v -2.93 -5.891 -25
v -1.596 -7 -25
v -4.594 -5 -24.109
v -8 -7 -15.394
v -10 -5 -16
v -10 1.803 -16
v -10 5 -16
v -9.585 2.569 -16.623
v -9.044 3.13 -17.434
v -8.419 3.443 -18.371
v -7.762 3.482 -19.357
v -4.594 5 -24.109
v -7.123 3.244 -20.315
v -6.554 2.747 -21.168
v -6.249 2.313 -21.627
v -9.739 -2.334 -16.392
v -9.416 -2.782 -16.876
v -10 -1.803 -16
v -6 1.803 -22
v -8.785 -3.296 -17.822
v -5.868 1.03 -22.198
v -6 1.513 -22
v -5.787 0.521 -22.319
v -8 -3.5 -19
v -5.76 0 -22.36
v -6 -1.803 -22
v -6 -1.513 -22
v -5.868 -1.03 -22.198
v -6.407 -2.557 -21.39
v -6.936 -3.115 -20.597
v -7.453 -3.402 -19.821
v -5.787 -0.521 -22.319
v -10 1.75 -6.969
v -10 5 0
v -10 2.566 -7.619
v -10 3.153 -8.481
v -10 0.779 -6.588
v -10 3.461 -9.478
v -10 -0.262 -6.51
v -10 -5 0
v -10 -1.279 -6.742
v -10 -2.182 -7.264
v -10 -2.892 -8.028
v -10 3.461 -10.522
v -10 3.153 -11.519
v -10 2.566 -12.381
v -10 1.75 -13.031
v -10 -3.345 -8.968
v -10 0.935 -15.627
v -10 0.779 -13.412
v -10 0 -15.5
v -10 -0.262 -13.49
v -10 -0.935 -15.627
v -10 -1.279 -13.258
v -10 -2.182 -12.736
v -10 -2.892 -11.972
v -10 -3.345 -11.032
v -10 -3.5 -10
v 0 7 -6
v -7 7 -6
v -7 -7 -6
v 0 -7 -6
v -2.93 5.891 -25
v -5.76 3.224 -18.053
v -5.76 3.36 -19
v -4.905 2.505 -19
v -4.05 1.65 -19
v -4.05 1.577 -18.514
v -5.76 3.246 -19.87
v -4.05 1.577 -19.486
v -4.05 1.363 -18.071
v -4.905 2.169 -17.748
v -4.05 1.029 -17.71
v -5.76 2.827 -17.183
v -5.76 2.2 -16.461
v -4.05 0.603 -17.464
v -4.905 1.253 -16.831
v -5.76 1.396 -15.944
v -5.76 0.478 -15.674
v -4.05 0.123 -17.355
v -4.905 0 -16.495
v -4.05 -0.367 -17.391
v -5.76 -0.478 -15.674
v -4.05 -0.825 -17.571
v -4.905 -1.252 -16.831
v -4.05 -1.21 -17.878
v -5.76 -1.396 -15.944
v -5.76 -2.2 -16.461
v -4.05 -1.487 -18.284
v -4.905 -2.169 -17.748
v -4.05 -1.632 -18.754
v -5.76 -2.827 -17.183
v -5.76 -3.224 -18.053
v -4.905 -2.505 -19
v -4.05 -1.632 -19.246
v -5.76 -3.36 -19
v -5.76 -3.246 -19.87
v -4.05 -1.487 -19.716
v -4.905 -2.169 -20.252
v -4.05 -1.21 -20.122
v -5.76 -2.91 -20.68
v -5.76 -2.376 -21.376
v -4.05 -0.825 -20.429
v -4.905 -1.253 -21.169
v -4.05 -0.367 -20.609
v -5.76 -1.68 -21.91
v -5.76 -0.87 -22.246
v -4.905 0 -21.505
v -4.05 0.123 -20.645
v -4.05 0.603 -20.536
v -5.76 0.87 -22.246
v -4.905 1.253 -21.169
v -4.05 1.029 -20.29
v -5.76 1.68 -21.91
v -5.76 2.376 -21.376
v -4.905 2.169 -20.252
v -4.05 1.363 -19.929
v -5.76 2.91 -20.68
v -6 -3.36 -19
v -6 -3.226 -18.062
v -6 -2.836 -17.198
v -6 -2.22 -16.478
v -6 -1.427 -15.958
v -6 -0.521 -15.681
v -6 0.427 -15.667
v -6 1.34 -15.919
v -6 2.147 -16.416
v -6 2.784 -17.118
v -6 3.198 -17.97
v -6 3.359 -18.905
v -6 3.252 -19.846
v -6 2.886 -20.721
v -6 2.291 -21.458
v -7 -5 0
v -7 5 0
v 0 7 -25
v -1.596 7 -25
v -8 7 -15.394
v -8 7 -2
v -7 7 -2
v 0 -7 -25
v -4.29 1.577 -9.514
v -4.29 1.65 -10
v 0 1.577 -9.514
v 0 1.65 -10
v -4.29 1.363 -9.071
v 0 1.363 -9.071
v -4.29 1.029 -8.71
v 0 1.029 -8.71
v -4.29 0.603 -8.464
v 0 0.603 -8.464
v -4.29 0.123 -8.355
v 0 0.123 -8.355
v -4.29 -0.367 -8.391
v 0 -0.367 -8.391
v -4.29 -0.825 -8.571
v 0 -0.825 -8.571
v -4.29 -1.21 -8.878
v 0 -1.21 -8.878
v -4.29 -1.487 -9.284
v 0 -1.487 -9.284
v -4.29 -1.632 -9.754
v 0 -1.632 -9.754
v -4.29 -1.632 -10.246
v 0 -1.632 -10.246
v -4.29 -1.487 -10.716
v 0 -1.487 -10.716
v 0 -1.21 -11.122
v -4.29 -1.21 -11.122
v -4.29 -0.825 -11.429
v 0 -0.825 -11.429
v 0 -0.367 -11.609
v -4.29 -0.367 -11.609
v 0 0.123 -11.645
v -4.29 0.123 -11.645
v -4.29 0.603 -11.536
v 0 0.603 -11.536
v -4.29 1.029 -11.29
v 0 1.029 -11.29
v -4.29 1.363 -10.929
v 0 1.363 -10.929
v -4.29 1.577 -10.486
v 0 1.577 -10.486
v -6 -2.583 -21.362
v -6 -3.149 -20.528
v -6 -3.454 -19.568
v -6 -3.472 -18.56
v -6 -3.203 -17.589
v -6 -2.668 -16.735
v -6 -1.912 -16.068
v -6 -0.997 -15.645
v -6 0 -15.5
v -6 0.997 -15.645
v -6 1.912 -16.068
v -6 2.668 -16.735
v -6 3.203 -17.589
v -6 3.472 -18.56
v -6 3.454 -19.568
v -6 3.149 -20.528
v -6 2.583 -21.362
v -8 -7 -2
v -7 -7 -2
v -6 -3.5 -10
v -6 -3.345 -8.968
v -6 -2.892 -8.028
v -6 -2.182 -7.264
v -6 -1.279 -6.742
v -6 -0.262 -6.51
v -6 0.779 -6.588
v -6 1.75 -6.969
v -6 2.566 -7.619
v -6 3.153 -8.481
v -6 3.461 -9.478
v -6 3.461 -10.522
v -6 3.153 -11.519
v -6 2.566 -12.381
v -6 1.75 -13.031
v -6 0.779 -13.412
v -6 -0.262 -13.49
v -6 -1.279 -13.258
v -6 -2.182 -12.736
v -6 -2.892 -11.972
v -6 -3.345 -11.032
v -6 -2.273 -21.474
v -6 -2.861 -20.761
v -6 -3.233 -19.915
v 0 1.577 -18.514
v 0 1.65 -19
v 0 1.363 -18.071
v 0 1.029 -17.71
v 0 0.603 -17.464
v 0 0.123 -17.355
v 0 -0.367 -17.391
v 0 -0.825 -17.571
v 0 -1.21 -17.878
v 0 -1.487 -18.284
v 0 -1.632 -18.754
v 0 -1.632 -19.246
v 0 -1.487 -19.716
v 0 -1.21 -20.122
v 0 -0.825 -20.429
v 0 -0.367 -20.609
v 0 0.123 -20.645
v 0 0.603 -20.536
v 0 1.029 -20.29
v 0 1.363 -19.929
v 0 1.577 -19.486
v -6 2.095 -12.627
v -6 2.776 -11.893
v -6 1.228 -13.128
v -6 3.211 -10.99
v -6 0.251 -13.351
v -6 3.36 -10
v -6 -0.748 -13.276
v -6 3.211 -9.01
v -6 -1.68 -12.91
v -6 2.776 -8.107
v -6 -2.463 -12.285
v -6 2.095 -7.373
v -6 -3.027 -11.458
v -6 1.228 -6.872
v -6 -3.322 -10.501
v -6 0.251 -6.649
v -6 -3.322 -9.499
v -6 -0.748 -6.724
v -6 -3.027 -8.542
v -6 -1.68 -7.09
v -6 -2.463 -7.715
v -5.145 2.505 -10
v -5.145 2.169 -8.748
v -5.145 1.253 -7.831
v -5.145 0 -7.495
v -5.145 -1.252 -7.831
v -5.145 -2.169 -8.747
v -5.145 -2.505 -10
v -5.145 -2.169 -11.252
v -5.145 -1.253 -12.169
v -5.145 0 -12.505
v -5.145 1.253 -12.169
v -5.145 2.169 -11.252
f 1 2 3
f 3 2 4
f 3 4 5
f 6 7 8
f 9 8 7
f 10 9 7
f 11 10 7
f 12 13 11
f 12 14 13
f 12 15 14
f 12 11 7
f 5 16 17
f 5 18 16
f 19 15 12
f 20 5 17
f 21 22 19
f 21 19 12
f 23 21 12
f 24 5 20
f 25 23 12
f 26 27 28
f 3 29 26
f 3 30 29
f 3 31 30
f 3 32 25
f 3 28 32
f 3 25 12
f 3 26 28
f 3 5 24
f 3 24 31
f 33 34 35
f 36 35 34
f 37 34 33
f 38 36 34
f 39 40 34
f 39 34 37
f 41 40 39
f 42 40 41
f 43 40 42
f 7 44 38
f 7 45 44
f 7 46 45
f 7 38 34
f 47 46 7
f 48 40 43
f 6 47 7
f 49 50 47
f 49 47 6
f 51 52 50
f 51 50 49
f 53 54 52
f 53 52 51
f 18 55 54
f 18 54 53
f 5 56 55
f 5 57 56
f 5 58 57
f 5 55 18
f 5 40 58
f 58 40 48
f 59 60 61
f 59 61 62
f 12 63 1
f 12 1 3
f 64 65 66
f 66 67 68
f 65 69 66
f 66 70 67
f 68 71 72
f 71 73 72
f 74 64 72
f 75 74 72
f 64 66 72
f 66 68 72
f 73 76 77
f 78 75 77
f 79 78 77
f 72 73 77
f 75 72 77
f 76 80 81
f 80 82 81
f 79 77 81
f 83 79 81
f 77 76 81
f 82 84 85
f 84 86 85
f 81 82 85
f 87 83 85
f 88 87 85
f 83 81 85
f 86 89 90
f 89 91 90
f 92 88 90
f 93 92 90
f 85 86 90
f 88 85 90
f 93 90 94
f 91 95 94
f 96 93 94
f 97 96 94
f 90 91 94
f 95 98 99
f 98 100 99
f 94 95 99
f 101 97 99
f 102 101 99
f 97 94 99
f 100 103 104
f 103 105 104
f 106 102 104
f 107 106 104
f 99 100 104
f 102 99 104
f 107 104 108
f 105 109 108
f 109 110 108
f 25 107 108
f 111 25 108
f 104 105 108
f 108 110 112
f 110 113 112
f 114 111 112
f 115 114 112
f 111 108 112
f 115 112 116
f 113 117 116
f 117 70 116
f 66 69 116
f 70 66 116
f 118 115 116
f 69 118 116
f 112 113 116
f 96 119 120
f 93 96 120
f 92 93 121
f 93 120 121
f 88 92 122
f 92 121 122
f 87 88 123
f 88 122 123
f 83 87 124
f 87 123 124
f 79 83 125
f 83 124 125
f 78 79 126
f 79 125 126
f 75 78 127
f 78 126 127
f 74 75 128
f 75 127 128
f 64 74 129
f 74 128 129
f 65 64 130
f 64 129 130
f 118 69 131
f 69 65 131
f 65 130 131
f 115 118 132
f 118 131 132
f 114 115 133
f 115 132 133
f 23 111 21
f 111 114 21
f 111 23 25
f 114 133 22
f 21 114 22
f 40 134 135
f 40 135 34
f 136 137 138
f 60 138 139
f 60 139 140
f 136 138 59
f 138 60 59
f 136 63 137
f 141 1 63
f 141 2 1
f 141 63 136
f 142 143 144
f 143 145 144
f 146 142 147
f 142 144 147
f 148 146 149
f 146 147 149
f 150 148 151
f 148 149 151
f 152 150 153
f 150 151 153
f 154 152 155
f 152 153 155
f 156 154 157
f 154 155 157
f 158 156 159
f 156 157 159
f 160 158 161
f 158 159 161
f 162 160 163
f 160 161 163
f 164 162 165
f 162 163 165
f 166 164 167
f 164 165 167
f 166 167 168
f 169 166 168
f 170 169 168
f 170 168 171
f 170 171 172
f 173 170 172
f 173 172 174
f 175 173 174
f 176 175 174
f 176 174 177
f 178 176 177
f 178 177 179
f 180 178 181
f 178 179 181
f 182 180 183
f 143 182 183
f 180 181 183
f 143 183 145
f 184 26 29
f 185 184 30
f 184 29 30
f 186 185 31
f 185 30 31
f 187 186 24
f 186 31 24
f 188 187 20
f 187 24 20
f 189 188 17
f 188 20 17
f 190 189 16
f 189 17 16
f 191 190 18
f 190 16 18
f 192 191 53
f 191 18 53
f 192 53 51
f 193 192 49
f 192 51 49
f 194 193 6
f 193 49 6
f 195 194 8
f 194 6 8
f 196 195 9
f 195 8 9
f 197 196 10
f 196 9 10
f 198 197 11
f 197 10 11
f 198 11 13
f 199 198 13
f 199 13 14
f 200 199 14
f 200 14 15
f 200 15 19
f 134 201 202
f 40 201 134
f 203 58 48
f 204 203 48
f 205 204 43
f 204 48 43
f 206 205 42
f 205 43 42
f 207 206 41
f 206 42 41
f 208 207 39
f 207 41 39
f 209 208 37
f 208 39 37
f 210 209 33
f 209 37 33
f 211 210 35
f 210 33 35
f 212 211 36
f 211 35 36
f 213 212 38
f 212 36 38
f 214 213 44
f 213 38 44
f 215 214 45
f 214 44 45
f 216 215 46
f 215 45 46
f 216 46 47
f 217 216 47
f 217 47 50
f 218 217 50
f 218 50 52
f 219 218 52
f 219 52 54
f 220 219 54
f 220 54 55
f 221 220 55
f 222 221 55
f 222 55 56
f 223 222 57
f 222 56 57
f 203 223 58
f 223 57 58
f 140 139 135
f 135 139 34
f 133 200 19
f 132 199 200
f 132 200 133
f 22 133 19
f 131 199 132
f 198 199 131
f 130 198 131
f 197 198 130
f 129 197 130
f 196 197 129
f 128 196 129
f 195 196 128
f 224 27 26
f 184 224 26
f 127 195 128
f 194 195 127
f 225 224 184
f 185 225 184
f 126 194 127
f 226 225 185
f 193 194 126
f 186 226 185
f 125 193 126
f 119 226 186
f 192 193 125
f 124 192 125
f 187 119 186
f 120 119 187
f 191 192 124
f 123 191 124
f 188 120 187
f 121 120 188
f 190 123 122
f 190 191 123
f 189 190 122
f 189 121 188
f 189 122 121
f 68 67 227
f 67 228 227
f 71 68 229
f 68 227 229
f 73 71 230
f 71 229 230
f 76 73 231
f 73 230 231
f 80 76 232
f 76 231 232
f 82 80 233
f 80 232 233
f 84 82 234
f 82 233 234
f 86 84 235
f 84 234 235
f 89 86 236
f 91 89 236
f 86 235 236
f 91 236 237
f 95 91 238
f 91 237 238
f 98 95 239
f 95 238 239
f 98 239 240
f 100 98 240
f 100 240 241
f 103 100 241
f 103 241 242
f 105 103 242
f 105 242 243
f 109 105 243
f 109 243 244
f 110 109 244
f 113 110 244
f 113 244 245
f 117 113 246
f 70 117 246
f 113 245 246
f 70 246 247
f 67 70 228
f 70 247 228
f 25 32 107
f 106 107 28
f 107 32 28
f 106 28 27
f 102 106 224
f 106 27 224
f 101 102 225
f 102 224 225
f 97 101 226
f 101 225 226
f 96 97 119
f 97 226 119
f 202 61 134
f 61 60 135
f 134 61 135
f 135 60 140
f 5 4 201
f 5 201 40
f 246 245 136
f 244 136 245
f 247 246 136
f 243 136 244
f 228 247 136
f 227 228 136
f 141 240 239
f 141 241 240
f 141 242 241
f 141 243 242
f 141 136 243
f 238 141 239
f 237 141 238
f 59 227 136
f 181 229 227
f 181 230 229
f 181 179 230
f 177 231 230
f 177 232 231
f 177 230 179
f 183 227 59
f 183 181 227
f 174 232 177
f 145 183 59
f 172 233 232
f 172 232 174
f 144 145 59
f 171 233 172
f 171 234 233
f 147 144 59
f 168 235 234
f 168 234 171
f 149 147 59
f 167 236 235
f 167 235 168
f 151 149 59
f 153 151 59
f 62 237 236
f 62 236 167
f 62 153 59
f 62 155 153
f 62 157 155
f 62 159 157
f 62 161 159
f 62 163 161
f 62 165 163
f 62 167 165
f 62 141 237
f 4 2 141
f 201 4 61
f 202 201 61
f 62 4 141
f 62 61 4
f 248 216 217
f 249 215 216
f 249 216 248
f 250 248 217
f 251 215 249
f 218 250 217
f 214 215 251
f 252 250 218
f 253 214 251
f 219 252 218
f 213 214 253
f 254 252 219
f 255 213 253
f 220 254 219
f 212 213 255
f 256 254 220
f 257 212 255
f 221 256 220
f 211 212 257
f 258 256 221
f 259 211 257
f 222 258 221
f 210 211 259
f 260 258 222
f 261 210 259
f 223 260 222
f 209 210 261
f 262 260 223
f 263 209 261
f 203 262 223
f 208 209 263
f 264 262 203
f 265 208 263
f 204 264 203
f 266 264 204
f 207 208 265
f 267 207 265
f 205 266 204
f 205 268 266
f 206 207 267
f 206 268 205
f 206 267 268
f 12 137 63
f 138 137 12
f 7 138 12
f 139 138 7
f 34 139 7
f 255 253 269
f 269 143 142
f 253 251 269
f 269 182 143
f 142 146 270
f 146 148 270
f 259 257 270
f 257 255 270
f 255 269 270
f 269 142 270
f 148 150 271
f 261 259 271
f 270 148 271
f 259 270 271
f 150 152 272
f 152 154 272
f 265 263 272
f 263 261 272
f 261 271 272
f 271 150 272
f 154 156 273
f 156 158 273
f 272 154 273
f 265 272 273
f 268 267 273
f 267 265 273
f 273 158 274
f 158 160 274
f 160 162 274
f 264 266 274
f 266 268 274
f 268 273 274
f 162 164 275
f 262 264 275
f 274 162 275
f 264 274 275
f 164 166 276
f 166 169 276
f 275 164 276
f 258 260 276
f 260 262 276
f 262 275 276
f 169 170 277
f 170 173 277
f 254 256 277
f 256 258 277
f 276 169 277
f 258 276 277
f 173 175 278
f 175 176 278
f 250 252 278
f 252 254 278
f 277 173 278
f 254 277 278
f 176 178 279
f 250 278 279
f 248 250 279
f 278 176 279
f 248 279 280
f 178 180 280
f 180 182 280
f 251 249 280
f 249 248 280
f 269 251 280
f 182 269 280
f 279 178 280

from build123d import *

# Parameters (mm, degrees)
F1_DEPTH       = 7
F2_R           = 3.5
F3_DEPTH       = 4
F4_D           = 3.3
F4_START       = 4
F4_START_2     = 4.24
F4_CSINK_D     = 6.72
F4_CSINK_ANGLE = 90
F5_T1_DEPTH    = 20.2867319519
F5_T3_DEPTH    = 26.2867319519
F5_T5_DEPTH    = 21.1033857783
F5_T7_DEPTH    = 19.707629012
F6_W           = 7
F6_H           = 6
F7_DEPTH       = 7.001
F7_DEPTH_BACK  = 7.001


# Not quite as in the source:
# - a fillet or chamfer that OpenCascade refuses, or shapes differently, is made with other operations: its cross-section is extruded or revolved along the edge and cut away or added


with BuildPart() as f1:
    # F0 (on Front) → F1 (new body, symmetric)
    with BuildSketch(Plane.XZ):
        Polygon((0, -25), (0, 0), (-10, 0), (-10, -16), (-4, -25), align=None)
    extrude(amount=F1_DEPTH, both=True)

    # F2 (on face) → F3 (cut)
    with BuildSketch(Plane(origin=(-10, 0, 0), x_dir=(0, -1, 0), z_dir=(-1, 0, 0))):
        with Locations((0, -10)):
            Circle(F2_R)
        with Locations((0, -19)):
            Circle(F2_R)
    extrude(amount=-F3_DEPTH, mode=Mode.SUBTRACT)

    # F4 (through all)
    # its depths count from where the whole tool has entered the part; down to there all is cleared
    with Locations(Plane(origin=(-10, 0, 0), x_dir=(0, -1, 0), z_dir=(-1, 0, 0))):
        with Locations((0, -19, -F4_START_2), (0, -10, -F4_START)):
            CounterSinkHole(F4_D / 2, F4_CSINK_D / 2, counter_sink_angle=F4_CSINK_ANGLE)

    # F5: chamfer of 2 on 7 edges, made by hand

    # F5_s2 → F5_t1 (cut)
    with BuildSketch(Plane.YZ.offset(-15.1433659759)):
        Polygon((-7, -2), (-5, 0), (-7, 0), align=None)
        Polygon((7, -2), (5, 0), (7, 0), align=None)
    extrude(amount=F5_T1_DEPTH, mode=Mode.SUBTRACT)

    # F5_s4 → F5_t3 (cut)
    with BuildSketch(Plane.XY.offset(-21.1433659759)):
        Polygon((-8, 7), (-10, 5), (-10, 7), align=None)
        Polygon((-8, -7), (-10, -5), (-10, -7), align=None)
    extrude(amount=F5_T3_DEPTH, mode=Mode.SUBTRACT)

    # F5_s6 → F5_t5 (cut)
    with BuildSketch(Plane(origin=(1.4546661916, 0, -2.1819992874), x_dir=(0, 1, 0), z_dir=(0.5547001962, 0, -0.8320502943))):
        Polygon((-7, -15.195706083), (-5, -17.195706083), (-7, -17.195706083), align=None)
        Polygon((7, -15.195706083), (5, -17.195706083), (7, -17.195706083), align=None)
    extrude(amount=F5_T5_DEPTH, mode=Mode.SUBTRACT)

    # F5_s8 → F5_t7 (cut)
    with BuildSketch(Plane.XZ.offset(-9.853814506)):
        Polygon((-2.929632483, -25), (-4.5937330717, -24.1094003925), (-4, -25), align=None)
    extrude(amount=F5_T7_DEPTH, mode=Mode.SUBTRACT)

    # F6 (on Front) → F7 (cut, two sides)
    with BuildSketch(Plane.XZ) as f7_sk:
        with Locations((-3.5, -3)):
            Rectangle(F6_W, F6_H)
    extrude(amount=-F7_DEPTH, mode=Mode.SUBTRACT)
    extrude(f7_sk.sketch, amount=F7_DEPTH_BACK, mode=Mode.SUBTRACT)


solid = f1.part
